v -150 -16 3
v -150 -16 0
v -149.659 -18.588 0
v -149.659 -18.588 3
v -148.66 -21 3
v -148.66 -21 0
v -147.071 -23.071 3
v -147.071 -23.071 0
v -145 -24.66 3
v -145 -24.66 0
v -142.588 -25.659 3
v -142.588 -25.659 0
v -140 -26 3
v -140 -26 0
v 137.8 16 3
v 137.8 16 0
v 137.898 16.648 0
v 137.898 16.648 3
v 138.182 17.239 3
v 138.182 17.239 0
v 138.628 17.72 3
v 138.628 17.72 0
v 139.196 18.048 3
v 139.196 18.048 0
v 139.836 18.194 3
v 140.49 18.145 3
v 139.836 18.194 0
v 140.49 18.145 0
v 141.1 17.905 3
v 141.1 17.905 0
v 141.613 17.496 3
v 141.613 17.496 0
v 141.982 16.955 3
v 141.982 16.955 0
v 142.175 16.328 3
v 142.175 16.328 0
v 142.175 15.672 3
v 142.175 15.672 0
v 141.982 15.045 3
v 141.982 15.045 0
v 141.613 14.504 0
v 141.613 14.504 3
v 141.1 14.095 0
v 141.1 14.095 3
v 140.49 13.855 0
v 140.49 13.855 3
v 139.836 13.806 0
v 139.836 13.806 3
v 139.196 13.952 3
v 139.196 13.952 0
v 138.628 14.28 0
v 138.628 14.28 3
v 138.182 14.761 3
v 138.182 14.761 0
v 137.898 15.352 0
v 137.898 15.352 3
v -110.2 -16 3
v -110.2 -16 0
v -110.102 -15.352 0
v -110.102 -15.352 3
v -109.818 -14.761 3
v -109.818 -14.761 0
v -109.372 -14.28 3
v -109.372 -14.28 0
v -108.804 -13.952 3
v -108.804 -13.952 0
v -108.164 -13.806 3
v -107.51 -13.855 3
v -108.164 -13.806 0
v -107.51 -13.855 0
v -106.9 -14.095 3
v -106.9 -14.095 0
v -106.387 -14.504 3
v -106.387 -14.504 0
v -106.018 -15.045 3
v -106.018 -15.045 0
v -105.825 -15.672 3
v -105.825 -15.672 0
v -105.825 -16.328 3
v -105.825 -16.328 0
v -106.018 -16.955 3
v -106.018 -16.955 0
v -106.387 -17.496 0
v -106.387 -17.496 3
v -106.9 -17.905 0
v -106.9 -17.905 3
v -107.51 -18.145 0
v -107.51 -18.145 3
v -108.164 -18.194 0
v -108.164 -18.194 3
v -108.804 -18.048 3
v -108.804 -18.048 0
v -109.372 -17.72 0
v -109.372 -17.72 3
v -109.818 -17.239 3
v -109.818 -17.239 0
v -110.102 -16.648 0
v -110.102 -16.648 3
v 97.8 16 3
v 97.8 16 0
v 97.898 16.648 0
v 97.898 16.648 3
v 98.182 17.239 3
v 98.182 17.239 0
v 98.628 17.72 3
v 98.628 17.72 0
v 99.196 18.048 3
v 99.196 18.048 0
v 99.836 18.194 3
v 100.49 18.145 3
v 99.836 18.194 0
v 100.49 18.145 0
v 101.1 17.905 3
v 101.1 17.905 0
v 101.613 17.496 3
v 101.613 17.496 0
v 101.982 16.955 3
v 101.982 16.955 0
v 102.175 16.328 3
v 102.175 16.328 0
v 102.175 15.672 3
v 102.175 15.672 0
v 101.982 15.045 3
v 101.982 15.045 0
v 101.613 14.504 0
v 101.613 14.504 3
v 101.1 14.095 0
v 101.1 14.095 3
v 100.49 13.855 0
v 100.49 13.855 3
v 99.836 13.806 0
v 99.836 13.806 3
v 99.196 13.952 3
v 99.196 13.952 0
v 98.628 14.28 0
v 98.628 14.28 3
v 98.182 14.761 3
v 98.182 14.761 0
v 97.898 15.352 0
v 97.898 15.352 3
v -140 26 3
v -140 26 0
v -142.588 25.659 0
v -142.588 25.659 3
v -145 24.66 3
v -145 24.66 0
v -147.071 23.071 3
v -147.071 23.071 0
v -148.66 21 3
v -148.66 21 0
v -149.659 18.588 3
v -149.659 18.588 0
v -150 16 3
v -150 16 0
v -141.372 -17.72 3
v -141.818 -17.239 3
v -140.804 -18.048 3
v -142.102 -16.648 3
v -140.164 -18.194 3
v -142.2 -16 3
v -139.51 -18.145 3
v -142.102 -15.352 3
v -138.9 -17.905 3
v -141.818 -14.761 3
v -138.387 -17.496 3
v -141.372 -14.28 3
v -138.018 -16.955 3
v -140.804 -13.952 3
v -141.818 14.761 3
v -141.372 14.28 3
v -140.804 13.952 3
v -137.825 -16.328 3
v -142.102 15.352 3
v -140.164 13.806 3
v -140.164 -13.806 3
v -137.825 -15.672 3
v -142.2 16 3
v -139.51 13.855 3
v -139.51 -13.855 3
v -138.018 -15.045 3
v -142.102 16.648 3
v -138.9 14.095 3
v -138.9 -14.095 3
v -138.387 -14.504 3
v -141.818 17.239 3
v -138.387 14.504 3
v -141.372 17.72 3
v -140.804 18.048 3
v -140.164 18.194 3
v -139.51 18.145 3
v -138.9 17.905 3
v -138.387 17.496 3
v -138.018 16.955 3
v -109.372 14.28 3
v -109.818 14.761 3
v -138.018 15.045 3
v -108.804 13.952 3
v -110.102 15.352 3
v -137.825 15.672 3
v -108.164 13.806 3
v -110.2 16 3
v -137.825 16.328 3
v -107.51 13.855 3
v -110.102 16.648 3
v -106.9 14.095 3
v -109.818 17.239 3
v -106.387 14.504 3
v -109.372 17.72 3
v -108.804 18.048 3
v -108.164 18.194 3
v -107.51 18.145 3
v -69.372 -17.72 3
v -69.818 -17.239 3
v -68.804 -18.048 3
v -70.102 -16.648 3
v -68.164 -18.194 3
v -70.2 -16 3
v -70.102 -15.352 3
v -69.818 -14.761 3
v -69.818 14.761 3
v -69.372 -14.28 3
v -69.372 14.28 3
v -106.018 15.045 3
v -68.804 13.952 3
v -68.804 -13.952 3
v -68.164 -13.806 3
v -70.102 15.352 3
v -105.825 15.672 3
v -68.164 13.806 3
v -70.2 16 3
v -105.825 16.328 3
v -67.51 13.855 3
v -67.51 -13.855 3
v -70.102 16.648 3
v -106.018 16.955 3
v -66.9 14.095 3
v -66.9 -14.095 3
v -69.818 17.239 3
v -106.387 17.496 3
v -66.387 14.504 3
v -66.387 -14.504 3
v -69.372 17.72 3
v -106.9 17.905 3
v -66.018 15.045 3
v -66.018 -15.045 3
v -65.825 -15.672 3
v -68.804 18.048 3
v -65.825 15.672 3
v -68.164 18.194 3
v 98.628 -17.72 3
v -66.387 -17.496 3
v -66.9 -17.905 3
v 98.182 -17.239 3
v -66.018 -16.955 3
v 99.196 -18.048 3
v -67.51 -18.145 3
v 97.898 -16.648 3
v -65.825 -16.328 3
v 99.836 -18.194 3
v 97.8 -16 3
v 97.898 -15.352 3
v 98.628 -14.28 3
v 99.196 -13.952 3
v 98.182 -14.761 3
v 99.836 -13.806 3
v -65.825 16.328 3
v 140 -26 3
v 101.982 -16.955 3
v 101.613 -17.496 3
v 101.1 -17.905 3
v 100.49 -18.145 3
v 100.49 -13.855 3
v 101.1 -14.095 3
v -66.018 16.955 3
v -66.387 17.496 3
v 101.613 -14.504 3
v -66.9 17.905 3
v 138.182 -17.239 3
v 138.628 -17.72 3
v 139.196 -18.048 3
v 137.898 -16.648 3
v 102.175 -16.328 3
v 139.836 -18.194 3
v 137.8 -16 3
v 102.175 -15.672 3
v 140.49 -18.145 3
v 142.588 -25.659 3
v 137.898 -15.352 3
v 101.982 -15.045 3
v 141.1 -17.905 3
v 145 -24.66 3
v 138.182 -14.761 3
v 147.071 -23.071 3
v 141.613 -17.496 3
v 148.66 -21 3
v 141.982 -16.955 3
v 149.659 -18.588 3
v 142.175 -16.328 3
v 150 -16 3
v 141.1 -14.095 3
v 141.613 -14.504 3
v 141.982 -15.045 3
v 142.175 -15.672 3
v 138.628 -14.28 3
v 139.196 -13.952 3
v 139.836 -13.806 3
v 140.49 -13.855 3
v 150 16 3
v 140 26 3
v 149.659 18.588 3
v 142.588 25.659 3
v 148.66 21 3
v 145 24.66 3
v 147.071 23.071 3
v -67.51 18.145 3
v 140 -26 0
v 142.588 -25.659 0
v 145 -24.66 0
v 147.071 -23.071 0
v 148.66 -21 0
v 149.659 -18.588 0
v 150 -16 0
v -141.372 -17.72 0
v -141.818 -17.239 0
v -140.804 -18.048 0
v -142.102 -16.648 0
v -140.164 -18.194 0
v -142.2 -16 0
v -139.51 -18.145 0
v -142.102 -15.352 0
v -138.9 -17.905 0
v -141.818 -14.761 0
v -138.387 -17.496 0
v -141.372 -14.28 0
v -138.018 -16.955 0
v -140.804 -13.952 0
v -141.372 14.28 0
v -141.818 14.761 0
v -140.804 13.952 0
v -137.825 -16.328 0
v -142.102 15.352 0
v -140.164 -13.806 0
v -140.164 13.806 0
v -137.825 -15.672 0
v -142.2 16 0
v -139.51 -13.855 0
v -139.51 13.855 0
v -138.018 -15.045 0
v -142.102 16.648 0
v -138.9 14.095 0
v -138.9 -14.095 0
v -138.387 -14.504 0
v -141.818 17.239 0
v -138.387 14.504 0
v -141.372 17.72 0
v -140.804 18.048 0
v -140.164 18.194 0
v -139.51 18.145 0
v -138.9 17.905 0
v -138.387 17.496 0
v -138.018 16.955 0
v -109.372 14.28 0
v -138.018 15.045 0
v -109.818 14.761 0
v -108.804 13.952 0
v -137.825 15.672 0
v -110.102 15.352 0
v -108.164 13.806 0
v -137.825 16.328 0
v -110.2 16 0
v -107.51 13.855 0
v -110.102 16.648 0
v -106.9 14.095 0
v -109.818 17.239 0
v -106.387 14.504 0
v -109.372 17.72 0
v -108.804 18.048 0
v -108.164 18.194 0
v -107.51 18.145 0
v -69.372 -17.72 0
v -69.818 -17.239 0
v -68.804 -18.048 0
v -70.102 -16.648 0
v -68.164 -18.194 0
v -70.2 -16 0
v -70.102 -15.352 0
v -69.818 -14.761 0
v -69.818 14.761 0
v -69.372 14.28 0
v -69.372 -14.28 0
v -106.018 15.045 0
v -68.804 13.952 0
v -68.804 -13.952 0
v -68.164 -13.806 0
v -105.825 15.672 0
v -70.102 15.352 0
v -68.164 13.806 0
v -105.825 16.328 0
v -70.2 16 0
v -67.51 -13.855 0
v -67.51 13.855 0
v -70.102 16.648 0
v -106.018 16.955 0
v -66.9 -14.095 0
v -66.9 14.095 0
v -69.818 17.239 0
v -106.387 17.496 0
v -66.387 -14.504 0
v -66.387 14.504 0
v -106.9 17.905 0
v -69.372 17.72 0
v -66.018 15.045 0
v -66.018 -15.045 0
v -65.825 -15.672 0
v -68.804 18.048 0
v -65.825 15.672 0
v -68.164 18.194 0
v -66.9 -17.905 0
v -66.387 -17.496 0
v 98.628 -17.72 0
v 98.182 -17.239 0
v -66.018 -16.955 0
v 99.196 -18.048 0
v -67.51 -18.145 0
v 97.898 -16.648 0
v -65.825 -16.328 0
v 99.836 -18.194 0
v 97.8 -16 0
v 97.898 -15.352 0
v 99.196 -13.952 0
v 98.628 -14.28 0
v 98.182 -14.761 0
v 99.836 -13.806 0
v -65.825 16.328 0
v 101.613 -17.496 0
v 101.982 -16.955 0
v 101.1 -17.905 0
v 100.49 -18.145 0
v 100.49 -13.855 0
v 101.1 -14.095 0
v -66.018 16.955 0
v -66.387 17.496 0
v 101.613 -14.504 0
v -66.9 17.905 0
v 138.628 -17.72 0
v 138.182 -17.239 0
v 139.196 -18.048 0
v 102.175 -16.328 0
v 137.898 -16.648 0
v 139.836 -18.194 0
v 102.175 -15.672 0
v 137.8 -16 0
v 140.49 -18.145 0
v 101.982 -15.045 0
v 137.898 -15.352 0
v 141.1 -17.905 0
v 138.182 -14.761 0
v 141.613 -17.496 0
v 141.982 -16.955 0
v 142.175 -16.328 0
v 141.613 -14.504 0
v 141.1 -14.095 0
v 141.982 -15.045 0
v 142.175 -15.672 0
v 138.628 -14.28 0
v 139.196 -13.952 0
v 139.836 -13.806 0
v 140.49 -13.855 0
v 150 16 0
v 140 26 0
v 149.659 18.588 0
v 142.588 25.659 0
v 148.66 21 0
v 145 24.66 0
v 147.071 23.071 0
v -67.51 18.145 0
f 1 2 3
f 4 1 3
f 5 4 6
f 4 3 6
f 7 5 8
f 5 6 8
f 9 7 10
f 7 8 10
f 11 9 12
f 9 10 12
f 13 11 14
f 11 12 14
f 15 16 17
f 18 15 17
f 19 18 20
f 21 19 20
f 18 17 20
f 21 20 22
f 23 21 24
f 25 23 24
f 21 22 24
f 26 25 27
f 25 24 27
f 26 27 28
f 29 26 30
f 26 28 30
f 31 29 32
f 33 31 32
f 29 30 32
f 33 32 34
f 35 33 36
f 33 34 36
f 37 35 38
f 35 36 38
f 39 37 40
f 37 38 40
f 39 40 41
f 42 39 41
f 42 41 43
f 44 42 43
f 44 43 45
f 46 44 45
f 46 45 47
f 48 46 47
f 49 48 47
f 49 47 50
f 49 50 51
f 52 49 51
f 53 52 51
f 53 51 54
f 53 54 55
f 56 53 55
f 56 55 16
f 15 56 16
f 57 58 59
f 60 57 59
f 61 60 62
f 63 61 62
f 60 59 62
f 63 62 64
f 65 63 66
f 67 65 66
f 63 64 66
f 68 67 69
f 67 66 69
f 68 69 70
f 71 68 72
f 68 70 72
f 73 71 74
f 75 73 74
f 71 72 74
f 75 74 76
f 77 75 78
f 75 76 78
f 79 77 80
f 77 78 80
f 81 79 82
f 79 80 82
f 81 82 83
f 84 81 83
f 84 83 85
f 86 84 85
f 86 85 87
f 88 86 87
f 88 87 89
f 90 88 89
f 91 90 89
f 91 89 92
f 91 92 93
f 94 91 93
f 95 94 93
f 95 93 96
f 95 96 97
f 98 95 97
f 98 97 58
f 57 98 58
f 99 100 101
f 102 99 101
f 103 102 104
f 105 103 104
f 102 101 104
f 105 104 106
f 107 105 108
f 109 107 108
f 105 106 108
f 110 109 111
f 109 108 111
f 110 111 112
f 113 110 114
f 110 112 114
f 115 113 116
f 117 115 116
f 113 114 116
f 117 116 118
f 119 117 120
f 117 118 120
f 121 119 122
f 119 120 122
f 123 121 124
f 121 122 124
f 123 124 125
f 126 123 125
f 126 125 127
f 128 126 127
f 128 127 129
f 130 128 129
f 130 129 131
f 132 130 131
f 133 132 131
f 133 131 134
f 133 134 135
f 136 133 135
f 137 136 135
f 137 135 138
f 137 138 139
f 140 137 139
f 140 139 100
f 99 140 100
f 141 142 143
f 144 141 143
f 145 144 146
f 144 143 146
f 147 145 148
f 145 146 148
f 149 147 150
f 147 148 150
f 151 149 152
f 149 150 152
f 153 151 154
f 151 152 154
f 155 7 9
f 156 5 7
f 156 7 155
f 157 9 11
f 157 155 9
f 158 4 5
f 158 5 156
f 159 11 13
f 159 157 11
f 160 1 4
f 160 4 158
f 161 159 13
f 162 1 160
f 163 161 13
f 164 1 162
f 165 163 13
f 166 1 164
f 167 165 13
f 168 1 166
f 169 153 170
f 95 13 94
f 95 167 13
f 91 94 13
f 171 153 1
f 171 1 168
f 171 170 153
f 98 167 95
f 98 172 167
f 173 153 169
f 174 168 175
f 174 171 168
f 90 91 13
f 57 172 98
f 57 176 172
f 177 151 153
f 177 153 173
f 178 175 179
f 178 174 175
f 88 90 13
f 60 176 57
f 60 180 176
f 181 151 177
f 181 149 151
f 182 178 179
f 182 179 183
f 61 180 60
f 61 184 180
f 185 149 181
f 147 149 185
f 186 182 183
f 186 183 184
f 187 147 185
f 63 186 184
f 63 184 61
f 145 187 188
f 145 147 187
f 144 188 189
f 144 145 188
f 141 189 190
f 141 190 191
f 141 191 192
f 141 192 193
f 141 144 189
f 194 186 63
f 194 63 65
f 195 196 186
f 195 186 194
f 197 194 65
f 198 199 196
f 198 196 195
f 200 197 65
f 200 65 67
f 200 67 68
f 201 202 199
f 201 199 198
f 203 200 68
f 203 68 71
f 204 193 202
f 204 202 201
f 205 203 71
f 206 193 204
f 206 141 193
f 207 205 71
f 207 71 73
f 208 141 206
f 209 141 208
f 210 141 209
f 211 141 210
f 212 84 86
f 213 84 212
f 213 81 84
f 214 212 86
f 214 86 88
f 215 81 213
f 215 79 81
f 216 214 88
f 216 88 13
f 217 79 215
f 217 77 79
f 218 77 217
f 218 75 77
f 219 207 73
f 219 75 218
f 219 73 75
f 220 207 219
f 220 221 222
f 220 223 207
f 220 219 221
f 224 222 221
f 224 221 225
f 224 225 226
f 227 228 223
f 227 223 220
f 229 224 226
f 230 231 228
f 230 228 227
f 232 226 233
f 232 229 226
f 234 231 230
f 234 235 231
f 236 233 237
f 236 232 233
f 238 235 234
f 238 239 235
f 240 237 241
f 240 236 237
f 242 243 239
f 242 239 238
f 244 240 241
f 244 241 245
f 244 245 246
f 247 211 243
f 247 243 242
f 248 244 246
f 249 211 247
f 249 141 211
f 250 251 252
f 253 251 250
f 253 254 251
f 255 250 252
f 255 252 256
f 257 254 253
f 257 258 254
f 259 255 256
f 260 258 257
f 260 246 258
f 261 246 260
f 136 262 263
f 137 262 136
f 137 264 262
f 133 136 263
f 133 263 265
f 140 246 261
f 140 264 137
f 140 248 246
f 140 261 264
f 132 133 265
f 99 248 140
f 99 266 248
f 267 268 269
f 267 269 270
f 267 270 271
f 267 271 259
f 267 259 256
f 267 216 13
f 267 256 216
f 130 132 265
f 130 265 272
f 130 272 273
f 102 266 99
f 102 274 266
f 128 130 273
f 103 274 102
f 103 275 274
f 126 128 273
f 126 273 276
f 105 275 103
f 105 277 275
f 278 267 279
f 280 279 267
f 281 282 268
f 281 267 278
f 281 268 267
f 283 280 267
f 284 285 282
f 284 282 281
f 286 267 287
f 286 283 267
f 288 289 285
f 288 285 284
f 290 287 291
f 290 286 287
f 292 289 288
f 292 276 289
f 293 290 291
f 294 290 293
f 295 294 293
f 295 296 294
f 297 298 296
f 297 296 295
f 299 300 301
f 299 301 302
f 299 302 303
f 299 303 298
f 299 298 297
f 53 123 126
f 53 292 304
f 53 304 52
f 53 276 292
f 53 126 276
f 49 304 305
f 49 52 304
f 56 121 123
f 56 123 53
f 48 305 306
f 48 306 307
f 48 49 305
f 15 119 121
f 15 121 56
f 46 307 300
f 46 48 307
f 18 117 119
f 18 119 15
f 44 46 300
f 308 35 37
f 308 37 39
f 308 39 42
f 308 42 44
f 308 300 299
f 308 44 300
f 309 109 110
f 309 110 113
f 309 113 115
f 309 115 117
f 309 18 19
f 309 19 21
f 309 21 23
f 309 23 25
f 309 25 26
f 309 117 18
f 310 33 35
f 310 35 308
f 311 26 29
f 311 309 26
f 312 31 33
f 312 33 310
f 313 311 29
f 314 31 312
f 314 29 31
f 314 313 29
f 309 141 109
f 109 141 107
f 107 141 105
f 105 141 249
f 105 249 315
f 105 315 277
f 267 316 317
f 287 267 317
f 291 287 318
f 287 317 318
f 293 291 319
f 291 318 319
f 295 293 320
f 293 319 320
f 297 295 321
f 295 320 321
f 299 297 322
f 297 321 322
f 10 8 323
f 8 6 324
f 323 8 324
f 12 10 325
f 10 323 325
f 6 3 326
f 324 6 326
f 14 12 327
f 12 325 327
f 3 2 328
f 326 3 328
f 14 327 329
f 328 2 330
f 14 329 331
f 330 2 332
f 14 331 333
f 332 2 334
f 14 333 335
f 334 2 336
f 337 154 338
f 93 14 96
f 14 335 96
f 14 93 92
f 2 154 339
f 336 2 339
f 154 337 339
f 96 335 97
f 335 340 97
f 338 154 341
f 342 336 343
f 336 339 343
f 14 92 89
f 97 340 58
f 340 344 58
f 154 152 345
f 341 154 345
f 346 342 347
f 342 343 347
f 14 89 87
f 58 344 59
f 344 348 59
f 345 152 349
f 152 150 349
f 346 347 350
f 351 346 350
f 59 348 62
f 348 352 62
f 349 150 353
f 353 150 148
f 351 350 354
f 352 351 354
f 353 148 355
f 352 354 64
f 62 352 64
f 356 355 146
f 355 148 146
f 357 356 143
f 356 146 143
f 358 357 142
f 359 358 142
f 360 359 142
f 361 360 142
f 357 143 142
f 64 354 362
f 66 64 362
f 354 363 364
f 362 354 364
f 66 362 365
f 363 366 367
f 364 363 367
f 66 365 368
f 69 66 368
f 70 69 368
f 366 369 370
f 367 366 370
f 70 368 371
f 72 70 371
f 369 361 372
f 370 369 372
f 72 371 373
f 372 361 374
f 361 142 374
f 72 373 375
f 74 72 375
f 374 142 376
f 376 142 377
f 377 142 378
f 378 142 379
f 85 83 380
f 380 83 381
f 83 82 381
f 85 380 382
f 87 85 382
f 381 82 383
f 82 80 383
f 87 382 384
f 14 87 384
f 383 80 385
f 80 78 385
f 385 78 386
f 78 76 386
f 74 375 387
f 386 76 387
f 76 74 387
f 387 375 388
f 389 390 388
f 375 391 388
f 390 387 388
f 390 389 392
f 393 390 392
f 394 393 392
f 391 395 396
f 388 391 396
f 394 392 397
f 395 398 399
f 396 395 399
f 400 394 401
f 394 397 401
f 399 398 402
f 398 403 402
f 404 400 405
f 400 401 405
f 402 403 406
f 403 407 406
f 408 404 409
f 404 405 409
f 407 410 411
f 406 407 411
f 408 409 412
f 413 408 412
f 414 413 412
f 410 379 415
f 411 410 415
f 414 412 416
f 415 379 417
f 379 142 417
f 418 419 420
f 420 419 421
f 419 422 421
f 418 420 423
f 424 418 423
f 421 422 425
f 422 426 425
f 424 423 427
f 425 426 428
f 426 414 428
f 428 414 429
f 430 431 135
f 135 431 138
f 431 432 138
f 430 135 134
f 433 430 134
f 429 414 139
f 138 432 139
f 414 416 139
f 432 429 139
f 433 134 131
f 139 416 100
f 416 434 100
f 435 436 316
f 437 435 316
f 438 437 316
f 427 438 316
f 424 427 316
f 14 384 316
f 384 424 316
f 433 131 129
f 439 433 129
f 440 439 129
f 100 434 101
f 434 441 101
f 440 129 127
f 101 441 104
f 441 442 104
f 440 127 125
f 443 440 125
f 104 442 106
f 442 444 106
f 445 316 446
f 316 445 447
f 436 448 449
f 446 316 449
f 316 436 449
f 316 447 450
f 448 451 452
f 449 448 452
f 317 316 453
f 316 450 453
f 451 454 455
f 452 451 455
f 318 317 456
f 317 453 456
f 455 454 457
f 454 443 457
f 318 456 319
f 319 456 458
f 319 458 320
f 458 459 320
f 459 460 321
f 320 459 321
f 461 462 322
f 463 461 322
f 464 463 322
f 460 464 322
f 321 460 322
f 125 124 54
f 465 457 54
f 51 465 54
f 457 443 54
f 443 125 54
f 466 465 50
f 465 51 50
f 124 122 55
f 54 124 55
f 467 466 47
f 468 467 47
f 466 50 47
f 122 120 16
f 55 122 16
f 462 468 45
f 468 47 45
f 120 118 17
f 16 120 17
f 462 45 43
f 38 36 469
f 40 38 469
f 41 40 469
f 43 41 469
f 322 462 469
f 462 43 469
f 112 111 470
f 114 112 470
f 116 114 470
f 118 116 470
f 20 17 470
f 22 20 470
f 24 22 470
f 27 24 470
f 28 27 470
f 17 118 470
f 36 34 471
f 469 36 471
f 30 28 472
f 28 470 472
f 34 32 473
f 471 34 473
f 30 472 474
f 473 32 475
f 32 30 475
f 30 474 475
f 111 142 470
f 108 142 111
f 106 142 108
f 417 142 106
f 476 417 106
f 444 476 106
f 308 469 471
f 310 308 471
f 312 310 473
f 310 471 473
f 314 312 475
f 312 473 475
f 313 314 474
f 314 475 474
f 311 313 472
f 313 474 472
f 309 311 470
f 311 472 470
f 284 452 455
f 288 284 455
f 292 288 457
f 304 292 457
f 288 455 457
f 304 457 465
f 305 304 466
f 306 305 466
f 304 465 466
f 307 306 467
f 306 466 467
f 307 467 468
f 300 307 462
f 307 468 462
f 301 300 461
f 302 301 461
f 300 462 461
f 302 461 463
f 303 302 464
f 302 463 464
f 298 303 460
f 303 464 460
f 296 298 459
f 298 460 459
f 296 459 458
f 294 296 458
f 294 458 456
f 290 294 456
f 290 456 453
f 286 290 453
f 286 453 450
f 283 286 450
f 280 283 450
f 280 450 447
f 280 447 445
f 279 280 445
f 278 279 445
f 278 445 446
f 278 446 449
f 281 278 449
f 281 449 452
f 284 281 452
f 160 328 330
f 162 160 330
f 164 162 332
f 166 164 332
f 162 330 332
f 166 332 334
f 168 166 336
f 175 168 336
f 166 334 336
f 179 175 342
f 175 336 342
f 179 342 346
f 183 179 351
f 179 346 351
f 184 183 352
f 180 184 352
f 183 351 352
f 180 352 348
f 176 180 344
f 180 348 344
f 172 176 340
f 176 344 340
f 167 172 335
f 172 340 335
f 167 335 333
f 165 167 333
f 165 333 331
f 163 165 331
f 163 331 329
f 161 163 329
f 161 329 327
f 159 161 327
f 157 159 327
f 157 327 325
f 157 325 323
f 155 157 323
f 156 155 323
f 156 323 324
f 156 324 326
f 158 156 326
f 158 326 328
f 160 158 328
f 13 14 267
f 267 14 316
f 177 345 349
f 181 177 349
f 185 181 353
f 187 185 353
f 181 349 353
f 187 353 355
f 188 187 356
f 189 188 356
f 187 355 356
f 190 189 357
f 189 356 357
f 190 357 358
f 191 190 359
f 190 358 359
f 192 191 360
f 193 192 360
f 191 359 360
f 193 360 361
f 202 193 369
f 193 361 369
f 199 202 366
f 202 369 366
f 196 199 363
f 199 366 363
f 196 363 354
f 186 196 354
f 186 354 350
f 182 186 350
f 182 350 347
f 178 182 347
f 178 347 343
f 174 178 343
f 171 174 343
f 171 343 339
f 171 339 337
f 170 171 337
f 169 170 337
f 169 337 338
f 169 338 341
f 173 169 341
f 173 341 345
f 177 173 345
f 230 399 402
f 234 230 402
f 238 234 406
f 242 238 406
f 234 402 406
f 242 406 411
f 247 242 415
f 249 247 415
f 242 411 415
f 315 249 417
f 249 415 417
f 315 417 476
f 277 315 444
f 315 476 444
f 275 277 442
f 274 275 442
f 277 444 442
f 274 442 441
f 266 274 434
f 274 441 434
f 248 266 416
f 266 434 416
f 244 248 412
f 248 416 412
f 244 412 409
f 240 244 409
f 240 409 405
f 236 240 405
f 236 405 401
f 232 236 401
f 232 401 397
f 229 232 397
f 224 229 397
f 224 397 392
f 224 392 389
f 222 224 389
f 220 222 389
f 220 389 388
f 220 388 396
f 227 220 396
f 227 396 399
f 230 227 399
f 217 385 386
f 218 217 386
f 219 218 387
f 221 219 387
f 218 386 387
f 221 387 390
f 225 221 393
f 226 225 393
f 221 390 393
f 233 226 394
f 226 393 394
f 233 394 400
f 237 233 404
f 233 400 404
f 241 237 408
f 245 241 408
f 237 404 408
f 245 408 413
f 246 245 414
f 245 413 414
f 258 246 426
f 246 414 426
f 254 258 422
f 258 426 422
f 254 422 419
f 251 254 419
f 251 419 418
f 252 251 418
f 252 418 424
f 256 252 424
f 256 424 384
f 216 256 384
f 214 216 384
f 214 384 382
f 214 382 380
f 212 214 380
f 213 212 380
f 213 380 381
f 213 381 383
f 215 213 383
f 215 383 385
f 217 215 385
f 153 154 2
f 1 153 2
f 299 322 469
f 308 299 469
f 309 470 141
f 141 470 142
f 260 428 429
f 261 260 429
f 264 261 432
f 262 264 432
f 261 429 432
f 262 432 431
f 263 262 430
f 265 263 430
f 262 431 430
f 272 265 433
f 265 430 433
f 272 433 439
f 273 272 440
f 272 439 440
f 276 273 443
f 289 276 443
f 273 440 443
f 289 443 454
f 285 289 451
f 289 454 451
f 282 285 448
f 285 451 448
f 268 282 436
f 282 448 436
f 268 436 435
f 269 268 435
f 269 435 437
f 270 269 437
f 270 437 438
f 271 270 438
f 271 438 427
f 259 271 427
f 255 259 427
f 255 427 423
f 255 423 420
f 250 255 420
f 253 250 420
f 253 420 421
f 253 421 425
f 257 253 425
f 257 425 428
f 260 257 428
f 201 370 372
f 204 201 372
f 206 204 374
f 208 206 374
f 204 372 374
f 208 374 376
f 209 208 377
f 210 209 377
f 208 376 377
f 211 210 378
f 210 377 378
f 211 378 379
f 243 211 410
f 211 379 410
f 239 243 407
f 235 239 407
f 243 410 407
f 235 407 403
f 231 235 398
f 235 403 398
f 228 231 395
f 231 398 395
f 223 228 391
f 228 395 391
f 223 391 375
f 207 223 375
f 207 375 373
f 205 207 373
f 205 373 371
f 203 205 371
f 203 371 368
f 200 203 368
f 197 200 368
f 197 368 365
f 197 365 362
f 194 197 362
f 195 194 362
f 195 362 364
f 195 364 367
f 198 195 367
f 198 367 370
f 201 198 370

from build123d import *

# Parameters (mm, degrees)
F1_DEPTH = 3
F3_D     = 4.4


with BuildPart() as f1:
    # F0 (on Top) → F1 (new body)
    with BuildSketch(Plane.XY):
        with BuildLine():
            Line((-140, -26), (140, -26))
            ThreePointArc((140, -26), (147.0710678119, -23.0710678119), (150, -16))
            Line((150, -16), (150, 16))
            ThreePointArc((150, 16), (147.0710678119, 23.0710678119), (140, 26))
            Line((140, 26), (-140, 26))
            ThreePointArc((-140, 26), (-147.0710678119, 23.0710678119), (-150, 16))
            Line((-150, 16), (-150, -16))
            ThreePointArc((-150, -16), (-147.0710678119, -23.0710678119), (-140, -26))
        make_face()
    extrude(amount=F1_DEPTH)

    # F3 (through all)
    with Locations(Plane.XY.offset(3)):
        with Locations((-140, 16), (-140, -16), (-108, -16), (-108, 16), (-68, 16), (-68, -16), (140, 16), (100, 16), (100, -16), (140, -16)):
            Hole(F3_D / 2)


solid = f1.part
